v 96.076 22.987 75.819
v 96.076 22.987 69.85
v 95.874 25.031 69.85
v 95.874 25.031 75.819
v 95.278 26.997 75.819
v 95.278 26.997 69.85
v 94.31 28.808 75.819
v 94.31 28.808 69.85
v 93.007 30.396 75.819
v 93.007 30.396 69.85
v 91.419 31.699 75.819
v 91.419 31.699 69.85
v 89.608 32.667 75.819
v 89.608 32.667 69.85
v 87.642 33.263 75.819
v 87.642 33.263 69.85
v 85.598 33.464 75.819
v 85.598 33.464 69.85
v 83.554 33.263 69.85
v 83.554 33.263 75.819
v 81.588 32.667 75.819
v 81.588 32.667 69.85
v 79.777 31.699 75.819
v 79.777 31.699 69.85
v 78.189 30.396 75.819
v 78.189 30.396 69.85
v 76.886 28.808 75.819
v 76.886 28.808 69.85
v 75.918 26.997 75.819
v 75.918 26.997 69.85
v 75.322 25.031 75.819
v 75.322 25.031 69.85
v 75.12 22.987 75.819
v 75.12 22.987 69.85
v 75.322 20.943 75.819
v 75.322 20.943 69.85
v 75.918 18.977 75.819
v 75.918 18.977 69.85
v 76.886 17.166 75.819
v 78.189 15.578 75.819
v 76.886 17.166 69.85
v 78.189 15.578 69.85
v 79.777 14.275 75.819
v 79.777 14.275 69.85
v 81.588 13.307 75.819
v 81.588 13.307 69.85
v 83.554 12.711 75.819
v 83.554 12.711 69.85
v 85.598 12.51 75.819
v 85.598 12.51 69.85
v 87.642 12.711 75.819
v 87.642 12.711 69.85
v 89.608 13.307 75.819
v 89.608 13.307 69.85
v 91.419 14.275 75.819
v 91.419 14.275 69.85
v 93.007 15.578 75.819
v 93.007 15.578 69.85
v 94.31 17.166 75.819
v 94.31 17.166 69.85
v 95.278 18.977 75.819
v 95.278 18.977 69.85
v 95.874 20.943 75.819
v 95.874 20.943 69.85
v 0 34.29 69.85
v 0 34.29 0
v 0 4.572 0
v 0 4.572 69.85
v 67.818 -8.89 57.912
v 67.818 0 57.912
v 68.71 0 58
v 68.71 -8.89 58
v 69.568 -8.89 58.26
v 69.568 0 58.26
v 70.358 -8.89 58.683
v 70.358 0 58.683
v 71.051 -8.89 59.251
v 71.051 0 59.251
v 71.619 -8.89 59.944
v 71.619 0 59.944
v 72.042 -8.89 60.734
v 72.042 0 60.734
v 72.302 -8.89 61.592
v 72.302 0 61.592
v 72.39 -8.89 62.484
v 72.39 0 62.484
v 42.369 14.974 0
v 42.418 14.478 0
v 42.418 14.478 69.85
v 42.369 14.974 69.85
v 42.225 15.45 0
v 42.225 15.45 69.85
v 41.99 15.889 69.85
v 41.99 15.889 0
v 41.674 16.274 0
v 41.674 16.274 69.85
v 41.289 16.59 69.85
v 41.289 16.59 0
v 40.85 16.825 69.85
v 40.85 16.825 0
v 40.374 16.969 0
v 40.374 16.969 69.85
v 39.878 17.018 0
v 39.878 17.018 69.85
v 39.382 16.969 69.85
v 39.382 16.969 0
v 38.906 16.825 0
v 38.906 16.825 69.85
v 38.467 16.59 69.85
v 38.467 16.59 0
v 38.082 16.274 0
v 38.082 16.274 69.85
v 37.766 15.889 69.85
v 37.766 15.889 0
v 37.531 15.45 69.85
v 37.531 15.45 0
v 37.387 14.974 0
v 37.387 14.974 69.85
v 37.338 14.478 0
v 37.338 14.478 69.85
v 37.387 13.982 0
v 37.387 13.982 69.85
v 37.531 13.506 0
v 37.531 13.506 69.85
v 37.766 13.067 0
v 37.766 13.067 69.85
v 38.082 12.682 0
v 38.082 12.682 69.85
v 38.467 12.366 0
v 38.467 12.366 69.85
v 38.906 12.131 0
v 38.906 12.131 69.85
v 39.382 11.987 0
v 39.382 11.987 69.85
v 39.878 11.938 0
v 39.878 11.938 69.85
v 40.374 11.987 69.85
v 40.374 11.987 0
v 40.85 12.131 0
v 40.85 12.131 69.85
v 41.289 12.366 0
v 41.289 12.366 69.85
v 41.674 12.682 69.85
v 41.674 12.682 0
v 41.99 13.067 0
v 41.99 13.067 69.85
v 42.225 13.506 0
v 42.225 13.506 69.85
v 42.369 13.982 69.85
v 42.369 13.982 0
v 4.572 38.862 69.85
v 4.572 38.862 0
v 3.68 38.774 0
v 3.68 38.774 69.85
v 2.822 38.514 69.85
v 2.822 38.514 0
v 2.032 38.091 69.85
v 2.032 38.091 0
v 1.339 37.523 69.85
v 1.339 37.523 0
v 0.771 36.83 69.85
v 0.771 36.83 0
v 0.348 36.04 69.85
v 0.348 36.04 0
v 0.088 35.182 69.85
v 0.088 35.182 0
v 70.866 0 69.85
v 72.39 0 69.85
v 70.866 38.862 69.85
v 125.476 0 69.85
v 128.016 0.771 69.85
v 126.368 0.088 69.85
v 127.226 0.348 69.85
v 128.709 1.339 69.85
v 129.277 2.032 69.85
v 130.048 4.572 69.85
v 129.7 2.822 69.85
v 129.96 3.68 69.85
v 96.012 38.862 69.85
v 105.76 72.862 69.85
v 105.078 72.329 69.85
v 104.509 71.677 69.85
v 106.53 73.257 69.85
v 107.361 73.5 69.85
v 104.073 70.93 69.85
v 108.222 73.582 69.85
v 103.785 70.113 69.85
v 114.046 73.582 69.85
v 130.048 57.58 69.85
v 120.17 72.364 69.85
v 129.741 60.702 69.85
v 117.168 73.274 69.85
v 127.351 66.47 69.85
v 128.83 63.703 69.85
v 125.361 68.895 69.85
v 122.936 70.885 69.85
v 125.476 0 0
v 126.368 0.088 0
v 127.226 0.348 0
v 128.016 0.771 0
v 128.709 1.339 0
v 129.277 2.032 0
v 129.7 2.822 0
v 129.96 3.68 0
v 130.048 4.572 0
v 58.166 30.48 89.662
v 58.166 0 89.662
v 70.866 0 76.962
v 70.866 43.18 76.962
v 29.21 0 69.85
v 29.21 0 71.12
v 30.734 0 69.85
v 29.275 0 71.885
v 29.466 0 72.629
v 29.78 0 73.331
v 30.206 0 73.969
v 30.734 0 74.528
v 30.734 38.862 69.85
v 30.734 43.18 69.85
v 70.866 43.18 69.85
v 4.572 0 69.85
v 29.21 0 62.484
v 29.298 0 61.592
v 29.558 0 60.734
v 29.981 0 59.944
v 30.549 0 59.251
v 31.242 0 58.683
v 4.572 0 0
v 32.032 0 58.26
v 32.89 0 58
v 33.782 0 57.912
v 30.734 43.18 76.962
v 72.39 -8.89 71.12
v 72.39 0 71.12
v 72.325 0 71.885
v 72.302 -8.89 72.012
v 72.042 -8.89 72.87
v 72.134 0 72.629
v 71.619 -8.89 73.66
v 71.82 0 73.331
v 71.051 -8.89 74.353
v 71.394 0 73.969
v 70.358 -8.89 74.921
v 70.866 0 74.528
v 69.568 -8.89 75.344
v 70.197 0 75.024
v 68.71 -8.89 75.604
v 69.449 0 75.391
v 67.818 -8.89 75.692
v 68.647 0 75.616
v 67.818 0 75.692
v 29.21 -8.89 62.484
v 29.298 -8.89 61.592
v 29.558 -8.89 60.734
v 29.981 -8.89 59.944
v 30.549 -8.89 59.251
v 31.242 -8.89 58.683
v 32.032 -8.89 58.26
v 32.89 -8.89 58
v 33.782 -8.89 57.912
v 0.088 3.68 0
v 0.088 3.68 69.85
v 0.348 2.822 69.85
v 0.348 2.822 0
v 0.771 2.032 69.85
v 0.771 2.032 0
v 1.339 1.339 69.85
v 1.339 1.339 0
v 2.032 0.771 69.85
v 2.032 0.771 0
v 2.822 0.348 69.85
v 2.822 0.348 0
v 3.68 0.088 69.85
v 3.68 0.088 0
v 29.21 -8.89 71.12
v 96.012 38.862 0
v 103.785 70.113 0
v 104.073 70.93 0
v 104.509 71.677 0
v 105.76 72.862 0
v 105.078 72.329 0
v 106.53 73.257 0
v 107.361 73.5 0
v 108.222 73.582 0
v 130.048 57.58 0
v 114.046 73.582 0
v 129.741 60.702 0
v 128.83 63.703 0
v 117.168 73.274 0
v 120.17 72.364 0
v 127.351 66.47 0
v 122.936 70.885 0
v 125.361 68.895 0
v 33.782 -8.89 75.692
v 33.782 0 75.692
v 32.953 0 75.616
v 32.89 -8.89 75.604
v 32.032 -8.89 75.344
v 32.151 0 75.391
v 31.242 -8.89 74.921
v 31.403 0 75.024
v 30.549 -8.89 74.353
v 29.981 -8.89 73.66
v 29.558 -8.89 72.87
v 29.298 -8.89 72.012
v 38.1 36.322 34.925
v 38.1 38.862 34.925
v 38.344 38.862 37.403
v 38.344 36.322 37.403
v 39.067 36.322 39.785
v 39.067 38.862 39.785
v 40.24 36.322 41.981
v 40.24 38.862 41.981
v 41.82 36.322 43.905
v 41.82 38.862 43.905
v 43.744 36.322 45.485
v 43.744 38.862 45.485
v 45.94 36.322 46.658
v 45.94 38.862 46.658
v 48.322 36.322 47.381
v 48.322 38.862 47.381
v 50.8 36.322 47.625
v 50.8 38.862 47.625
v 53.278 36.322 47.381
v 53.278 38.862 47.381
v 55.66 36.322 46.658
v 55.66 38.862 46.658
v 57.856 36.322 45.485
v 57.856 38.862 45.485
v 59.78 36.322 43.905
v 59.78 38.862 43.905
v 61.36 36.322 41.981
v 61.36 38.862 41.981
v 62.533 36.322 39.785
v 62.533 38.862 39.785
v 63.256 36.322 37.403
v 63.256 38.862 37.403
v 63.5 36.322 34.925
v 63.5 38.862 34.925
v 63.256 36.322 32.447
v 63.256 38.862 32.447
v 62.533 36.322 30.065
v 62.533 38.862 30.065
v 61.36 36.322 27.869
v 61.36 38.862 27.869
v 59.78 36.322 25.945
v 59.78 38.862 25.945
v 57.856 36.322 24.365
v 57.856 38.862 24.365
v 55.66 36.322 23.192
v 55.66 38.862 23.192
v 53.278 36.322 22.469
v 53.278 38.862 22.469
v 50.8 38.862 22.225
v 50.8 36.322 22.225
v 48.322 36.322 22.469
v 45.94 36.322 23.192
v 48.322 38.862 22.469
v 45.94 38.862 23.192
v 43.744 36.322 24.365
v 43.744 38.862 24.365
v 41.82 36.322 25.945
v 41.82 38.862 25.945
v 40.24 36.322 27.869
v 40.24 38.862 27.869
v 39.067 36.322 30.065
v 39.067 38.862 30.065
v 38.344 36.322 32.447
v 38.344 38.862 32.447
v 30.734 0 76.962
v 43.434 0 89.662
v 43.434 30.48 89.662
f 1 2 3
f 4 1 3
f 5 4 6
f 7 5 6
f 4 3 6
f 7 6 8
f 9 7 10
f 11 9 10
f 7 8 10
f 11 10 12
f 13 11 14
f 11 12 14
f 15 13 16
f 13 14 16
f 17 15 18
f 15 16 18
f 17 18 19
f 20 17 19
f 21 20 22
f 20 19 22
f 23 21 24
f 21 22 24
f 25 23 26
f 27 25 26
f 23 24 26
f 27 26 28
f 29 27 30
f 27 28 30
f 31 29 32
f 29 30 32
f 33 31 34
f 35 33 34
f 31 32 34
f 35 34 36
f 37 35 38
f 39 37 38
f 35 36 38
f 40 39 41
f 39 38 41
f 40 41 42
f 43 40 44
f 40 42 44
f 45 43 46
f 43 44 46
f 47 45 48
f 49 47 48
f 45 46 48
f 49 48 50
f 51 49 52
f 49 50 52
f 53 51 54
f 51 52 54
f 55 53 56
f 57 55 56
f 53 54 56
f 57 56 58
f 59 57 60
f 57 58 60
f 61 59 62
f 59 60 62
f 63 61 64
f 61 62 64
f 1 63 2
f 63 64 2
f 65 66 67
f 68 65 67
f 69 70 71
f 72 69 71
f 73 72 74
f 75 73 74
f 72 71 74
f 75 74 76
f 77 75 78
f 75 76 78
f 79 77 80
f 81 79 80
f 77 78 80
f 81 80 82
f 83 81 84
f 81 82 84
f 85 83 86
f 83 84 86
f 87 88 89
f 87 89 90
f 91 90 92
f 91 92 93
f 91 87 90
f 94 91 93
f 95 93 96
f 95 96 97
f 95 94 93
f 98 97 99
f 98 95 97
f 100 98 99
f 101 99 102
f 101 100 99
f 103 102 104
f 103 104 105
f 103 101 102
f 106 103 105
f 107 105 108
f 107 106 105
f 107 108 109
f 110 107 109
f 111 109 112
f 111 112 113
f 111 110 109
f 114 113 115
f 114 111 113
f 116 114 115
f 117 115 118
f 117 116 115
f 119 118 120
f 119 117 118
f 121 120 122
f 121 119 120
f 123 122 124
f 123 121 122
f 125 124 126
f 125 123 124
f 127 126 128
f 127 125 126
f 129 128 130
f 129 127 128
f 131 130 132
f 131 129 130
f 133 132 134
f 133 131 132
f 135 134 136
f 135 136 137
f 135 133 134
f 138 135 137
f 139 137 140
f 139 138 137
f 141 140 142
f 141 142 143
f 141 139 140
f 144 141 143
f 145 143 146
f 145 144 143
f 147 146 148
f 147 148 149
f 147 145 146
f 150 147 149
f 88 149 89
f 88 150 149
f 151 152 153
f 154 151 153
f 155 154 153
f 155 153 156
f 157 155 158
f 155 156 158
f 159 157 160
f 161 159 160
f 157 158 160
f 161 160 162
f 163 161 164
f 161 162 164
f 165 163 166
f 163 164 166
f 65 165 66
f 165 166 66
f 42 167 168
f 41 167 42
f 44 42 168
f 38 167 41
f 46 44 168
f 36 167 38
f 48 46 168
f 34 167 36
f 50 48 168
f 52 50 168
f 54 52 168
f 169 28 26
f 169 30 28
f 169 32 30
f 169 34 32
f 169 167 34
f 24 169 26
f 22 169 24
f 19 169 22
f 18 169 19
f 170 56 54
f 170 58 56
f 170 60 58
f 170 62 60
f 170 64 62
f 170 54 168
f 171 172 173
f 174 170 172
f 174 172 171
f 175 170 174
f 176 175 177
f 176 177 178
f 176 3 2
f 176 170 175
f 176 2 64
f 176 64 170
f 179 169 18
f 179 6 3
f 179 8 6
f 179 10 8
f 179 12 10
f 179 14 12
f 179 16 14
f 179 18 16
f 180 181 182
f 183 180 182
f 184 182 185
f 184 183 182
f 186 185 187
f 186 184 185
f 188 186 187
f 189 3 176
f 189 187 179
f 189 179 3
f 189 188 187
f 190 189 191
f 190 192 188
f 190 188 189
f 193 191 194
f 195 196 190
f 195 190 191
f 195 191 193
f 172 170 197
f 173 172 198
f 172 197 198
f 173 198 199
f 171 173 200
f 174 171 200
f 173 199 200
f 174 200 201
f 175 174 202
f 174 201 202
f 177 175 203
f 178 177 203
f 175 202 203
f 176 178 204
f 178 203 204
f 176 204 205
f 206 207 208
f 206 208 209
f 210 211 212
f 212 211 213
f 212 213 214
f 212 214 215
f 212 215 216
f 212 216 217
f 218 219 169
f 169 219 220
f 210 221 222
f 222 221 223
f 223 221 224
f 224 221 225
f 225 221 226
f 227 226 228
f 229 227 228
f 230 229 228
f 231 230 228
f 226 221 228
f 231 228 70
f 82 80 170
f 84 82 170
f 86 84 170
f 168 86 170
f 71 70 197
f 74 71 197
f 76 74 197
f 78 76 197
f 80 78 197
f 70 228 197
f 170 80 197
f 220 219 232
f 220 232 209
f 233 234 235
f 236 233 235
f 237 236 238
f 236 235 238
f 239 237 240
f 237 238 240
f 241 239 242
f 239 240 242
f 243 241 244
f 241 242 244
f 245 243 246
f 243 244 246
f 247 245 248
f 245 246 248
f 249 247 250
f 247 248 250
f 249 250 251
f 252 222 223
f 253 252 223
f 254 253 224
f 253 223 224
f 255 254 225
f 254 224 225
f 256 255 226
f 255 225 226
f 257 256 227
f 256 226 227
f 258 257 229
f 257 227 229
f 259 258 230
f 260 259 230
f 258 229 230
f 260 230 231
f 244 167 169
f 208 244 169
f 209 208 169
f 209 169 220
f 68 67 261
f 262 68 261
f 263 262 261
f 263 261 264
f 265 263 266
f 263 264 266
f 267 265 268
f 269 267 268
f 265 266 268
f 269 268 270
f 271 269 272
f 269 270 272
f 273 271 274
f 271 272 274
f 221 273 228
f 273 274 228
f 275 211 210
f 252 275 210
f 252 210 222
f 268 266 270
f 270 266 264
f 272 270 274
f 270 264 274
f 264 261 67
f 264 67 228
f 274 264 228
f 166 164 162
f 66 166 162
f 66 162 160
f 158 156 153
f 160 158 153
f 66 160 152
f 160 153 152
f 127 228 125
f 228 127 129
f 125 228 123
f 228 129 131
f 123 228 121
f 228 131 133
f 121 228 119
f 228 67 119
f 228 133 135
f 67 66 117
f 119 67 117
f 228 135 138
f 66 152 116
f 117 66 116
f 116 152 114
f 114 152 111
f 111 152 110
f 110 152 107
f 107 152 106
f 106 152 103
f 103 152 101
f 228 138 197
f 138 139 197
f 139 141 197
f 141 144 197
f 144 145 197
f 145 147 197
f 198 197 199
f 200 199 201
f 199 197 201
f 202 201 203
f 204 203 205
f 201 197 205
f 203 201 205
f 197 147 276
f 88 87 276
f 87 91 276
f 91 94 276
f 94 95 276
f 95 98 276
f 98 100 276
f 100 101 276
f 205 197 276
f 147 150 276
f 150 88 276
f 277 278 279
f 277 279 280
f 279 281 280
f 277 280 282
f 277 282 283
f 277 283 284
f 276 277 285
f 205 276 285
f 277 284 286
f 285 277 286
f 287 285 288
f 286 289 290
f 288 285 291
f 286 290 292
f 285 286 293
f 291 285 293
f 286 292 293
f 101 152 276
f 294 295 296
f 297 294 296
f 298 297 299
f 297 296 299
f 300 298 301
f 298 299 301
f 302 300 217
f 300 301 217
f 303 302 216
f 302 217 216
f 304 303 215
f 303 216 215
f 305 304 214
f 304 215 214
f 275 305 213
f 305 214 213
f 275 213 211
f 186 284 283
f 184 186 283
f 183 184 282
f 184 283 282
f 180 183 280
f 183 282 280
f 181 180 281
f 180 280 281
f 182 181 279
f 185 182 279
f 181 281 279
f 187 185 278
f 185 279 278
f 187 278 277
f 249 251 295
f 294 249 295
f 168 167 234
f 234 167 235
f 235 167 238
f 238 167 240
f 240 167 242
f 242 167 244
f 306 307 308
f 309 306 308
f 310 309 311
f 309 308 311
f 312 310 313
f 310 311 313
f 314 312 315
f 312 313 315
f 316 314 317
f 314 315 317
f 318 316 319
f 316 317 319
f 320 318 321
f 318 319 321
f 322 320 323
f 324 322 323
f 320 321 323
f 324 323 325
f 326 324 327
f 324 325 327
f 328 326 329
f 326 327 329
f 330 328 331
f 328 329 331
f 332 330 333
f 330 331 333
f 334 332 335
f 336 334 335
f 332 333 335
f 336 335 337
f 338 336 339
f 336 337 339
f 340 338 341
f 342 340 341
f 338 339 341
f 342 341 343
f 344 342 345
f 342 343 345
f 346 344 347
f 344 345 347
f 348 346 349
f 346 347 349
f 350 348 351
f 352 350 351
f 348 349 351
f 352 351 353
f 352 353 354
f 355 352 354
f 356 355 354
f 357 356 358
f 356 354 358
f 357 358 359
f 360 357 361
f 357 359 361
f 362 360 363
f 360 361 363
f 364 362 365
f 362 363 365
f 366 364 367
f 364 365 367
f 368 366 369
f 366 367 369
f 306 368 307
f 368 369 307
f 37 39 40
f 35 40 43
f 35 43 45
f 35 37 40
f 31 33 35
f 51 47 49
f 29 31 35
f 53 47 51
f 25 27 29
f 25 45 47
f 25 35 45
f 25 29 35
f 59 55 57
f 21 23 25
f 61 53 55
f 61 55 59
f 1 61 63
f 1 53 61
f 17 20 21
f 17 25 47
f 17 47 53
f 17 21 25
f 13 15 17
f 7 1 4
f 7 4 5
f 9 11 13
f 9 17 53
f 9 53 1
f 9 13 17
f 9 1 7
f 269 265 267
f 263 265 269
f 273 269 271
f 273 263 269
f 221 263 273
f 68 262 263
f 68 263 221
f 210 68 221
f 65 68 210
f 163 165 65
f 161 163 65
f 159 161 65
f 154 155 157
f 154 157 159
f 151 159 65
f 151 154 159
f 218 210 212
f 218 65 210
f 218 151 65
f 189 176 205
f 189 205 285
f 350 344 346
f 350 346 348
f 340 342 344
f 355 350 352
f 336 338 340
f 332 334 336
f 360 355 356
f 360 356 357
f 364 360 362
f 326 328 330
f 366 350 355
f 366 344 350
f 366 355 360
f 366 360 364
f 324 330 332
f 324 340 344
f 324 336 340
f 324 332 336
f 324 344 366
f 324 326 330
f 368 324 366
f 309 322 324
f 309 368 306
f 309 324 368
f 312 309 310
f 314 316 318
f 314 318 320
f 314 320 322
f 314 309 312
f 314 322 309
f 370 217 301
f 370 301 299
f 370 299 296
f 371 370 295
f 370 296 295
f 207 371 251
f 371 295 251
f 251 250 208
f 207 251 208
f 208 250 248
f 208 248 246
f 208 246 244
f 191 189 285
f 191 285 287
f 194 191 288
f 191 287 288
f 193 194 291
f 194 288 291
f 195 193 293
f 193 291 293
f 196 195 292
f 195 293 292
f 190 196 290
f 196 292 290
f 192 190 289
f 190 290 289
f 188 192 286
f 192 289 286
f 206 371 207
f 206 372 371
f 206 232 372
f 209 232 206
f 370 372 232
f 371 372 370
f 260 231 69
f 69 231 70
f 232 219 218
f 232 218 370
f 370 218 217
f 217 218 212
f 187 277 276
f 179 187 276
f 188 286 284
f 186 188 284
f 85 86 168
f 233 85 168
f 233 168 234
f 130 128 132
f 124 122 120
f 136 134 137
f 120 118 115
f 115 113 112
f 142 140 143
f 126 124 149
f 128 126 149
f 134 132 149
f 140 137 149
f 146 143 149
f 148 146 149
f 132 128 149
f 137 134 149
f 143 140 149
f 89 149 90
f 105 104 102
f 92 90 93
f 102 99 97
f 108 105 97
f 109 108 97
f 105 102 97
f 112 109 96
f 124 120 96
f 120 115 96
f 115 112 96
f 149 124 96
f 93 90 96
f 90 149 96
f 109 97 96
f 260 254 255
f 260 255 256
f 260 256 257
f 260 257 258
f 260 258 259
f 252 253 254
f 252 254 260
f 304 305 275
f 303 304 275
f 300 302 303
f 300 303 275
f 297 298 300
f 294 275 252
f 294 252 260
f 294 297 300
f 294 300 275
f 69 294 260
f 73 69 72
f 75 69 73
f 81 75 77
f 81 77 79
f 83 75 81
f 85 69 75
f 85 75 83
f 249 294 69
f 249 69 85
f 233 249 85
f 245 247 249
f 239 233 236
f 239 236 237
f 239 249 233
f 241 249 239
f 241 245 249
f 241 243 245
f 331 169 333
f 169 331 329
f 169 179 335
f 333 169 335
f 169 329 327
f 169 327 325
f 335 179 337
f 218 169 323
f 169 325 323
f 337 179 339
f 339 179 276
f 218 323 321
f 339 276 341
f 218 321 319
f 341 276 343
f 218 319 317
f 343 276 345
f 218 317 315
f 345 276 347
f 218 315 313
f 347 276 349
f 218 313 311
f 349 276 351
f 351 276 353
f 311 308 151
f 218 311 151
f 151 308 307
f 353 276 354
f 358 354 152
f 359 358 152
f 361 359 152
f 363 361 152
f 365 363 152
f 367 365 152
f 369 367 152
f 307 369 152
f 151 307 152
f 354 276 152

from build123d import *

# Parameters (mm, degrees)
F0_R      = 2.54
F1_DEPTH  = 69.85
F2_W      = 40.132
F2_H      = 38.862
F2_R      = 2.54
F2_H_2    = 4.318
F3_DEPTH  = 19.812
F4_SIZE   = 12.7
F6_DEPTH  = 8.89
F7_R      = 10.4775
F8_DEPTH  = 5.969
F9_R      = 12.7
F10_DEPTH = 2.54


with BuildPart() as f1:
    # F0 (on Top) → F1 (new body)
    with BuildSketch(Plane.XY):
        with BuildLine():
            Line((96.012, 38.862), (130.048, 38.862))
            Line((130.048, 38.862), (130.048, 57.5797104578))
            ThreePointArc((130.048, 57.5797104578), (125.3611227125, 68.8948331703), (114.046, 73.5817104578))
            Line((114.046, 73.5817104578), (108.2220946444, 73.5817104578))
            ThreePointArc((108.2220946444, 73.5817104578), (105.4062842868, 72.6117093515), (103.7852854611, 70.1132992724))
            Line((103.7852854611, 70.1132992724), (96.012, 38.862))
        make_face()
        with BuildLine():
            ThreePointArc((0, 4.572), (1.3391077964, 1.3391077964), (4.572, 0))
            Line((4.572, 0), (125.476, 0))
            ThreePointArc((125.476, 0), (128.7088922036, 1.3391077964), (130.048, 4.572))
            Line((130.048, 4.572), (130.048, 38.862))
            Line((130.048, 38.862), (96.012, 38.862))
            Line((96.012, 38.862), (4.572, 38.862))
            ThreePointArc((4.572, 38.862), (1.3391077964, 37.5228922036), (0, 34.29))
            Line((0, 34.29), (0, 4.572))
        make_face()
        with Locations((39.878, 14.478)):
            Circle(F0_R, mode=Mode.SUBTRACT)
    extrude(amount=F1_DEPTH)

    # F2 (on face) → F3 (join)
    with BuildSketch(Plane.XY.offset(69.85)):
        with Locations((50.8, 19.431)):
            Rectangle(F2_W, F2_H)
        with Locations((39.878, 14.478)):
            Circle(F2_R, mode=Mode.SUBTRACT)
        with Locations((50.8, 41.021)):
            Rectangle(F2_W, F2_H_2)
        with Locations((39.878, 14.478)):
            Circle(F2_R)
    extrude(amount=F3_DEPTH)

    # F4
    f4_edges = [f1.edges().sort_by_distance(p)[0] for p in [
        (70.866, 21.59, 89.662),
        (50.8, 43.18, 89.662),
        (30.734, 21.59, 89.662),
    ]]
    chamfer(f4_edges, length=F4_SIZE)

    # F5 (on Front) + F1_face1 (on face) → F6 (join)
    with BuildSketch(Plane.XZ):
        with BuildLine():
            ThreePointArc((29.21, 62.484), (30.5491077964, 59.2511077964), (33.782, 57.912))
            Line((33.782, 57.912), (67.818, 57.912))
            ThreePointArc((67.818, 57.912), (71.0508922036, 59.2511077964), (72.39, 62.484))
            Line((72.39, 62.484), (72.39, 71.12))
            ThreePointArc((72.39, 71.12), (71.0508922036, 74.3528922036), (67.818, 75.692))
            Line((67.818, 75.692), (33.782, 75.692))
            ThreePointArc((33.782, 75.692), (30.5491077964, 74.3528922036), (29.21, 71.12))
            Line((29.21, 71.12), (29.21, 62.484))
        make_face()
    with BuildSketch(Plane(origin=(50.292, 38.862, 34.925), x_dir=(-1, 0, 0), z_dir=(0, 1, 0))):
        Polygon((-45.72, 34.925), (-45.72, -34.925), (45.72, -34.925), (45.72, 34.925), (19.558, 34.925), (-20.574, 34.925), align=None)
    extrude(amount=F6_DEPTH, dir=(0, -1, 0))

    # F7 (on face) → F8 (join)
    with BuildSketch(Plane.XY.offset(69.85)):
        with Locations((85.598, 22.987)):
            Circle(F7_R)
    extrude(amount=F8_DEPTH)

    # F9 (on face) → F10 (cut)
    with BuildSketch(Plane(origin=(0, 38.862, 0), x_dir=(-1, 0, 0), z_dir=(0, 1, 0))):
        with Locations((-50.8, 34.925)):
            Circle(F9_R)
    extrude(amount=-F10_DEPTH, mode=Mode.SUBTRACT)


solid = f1.part
